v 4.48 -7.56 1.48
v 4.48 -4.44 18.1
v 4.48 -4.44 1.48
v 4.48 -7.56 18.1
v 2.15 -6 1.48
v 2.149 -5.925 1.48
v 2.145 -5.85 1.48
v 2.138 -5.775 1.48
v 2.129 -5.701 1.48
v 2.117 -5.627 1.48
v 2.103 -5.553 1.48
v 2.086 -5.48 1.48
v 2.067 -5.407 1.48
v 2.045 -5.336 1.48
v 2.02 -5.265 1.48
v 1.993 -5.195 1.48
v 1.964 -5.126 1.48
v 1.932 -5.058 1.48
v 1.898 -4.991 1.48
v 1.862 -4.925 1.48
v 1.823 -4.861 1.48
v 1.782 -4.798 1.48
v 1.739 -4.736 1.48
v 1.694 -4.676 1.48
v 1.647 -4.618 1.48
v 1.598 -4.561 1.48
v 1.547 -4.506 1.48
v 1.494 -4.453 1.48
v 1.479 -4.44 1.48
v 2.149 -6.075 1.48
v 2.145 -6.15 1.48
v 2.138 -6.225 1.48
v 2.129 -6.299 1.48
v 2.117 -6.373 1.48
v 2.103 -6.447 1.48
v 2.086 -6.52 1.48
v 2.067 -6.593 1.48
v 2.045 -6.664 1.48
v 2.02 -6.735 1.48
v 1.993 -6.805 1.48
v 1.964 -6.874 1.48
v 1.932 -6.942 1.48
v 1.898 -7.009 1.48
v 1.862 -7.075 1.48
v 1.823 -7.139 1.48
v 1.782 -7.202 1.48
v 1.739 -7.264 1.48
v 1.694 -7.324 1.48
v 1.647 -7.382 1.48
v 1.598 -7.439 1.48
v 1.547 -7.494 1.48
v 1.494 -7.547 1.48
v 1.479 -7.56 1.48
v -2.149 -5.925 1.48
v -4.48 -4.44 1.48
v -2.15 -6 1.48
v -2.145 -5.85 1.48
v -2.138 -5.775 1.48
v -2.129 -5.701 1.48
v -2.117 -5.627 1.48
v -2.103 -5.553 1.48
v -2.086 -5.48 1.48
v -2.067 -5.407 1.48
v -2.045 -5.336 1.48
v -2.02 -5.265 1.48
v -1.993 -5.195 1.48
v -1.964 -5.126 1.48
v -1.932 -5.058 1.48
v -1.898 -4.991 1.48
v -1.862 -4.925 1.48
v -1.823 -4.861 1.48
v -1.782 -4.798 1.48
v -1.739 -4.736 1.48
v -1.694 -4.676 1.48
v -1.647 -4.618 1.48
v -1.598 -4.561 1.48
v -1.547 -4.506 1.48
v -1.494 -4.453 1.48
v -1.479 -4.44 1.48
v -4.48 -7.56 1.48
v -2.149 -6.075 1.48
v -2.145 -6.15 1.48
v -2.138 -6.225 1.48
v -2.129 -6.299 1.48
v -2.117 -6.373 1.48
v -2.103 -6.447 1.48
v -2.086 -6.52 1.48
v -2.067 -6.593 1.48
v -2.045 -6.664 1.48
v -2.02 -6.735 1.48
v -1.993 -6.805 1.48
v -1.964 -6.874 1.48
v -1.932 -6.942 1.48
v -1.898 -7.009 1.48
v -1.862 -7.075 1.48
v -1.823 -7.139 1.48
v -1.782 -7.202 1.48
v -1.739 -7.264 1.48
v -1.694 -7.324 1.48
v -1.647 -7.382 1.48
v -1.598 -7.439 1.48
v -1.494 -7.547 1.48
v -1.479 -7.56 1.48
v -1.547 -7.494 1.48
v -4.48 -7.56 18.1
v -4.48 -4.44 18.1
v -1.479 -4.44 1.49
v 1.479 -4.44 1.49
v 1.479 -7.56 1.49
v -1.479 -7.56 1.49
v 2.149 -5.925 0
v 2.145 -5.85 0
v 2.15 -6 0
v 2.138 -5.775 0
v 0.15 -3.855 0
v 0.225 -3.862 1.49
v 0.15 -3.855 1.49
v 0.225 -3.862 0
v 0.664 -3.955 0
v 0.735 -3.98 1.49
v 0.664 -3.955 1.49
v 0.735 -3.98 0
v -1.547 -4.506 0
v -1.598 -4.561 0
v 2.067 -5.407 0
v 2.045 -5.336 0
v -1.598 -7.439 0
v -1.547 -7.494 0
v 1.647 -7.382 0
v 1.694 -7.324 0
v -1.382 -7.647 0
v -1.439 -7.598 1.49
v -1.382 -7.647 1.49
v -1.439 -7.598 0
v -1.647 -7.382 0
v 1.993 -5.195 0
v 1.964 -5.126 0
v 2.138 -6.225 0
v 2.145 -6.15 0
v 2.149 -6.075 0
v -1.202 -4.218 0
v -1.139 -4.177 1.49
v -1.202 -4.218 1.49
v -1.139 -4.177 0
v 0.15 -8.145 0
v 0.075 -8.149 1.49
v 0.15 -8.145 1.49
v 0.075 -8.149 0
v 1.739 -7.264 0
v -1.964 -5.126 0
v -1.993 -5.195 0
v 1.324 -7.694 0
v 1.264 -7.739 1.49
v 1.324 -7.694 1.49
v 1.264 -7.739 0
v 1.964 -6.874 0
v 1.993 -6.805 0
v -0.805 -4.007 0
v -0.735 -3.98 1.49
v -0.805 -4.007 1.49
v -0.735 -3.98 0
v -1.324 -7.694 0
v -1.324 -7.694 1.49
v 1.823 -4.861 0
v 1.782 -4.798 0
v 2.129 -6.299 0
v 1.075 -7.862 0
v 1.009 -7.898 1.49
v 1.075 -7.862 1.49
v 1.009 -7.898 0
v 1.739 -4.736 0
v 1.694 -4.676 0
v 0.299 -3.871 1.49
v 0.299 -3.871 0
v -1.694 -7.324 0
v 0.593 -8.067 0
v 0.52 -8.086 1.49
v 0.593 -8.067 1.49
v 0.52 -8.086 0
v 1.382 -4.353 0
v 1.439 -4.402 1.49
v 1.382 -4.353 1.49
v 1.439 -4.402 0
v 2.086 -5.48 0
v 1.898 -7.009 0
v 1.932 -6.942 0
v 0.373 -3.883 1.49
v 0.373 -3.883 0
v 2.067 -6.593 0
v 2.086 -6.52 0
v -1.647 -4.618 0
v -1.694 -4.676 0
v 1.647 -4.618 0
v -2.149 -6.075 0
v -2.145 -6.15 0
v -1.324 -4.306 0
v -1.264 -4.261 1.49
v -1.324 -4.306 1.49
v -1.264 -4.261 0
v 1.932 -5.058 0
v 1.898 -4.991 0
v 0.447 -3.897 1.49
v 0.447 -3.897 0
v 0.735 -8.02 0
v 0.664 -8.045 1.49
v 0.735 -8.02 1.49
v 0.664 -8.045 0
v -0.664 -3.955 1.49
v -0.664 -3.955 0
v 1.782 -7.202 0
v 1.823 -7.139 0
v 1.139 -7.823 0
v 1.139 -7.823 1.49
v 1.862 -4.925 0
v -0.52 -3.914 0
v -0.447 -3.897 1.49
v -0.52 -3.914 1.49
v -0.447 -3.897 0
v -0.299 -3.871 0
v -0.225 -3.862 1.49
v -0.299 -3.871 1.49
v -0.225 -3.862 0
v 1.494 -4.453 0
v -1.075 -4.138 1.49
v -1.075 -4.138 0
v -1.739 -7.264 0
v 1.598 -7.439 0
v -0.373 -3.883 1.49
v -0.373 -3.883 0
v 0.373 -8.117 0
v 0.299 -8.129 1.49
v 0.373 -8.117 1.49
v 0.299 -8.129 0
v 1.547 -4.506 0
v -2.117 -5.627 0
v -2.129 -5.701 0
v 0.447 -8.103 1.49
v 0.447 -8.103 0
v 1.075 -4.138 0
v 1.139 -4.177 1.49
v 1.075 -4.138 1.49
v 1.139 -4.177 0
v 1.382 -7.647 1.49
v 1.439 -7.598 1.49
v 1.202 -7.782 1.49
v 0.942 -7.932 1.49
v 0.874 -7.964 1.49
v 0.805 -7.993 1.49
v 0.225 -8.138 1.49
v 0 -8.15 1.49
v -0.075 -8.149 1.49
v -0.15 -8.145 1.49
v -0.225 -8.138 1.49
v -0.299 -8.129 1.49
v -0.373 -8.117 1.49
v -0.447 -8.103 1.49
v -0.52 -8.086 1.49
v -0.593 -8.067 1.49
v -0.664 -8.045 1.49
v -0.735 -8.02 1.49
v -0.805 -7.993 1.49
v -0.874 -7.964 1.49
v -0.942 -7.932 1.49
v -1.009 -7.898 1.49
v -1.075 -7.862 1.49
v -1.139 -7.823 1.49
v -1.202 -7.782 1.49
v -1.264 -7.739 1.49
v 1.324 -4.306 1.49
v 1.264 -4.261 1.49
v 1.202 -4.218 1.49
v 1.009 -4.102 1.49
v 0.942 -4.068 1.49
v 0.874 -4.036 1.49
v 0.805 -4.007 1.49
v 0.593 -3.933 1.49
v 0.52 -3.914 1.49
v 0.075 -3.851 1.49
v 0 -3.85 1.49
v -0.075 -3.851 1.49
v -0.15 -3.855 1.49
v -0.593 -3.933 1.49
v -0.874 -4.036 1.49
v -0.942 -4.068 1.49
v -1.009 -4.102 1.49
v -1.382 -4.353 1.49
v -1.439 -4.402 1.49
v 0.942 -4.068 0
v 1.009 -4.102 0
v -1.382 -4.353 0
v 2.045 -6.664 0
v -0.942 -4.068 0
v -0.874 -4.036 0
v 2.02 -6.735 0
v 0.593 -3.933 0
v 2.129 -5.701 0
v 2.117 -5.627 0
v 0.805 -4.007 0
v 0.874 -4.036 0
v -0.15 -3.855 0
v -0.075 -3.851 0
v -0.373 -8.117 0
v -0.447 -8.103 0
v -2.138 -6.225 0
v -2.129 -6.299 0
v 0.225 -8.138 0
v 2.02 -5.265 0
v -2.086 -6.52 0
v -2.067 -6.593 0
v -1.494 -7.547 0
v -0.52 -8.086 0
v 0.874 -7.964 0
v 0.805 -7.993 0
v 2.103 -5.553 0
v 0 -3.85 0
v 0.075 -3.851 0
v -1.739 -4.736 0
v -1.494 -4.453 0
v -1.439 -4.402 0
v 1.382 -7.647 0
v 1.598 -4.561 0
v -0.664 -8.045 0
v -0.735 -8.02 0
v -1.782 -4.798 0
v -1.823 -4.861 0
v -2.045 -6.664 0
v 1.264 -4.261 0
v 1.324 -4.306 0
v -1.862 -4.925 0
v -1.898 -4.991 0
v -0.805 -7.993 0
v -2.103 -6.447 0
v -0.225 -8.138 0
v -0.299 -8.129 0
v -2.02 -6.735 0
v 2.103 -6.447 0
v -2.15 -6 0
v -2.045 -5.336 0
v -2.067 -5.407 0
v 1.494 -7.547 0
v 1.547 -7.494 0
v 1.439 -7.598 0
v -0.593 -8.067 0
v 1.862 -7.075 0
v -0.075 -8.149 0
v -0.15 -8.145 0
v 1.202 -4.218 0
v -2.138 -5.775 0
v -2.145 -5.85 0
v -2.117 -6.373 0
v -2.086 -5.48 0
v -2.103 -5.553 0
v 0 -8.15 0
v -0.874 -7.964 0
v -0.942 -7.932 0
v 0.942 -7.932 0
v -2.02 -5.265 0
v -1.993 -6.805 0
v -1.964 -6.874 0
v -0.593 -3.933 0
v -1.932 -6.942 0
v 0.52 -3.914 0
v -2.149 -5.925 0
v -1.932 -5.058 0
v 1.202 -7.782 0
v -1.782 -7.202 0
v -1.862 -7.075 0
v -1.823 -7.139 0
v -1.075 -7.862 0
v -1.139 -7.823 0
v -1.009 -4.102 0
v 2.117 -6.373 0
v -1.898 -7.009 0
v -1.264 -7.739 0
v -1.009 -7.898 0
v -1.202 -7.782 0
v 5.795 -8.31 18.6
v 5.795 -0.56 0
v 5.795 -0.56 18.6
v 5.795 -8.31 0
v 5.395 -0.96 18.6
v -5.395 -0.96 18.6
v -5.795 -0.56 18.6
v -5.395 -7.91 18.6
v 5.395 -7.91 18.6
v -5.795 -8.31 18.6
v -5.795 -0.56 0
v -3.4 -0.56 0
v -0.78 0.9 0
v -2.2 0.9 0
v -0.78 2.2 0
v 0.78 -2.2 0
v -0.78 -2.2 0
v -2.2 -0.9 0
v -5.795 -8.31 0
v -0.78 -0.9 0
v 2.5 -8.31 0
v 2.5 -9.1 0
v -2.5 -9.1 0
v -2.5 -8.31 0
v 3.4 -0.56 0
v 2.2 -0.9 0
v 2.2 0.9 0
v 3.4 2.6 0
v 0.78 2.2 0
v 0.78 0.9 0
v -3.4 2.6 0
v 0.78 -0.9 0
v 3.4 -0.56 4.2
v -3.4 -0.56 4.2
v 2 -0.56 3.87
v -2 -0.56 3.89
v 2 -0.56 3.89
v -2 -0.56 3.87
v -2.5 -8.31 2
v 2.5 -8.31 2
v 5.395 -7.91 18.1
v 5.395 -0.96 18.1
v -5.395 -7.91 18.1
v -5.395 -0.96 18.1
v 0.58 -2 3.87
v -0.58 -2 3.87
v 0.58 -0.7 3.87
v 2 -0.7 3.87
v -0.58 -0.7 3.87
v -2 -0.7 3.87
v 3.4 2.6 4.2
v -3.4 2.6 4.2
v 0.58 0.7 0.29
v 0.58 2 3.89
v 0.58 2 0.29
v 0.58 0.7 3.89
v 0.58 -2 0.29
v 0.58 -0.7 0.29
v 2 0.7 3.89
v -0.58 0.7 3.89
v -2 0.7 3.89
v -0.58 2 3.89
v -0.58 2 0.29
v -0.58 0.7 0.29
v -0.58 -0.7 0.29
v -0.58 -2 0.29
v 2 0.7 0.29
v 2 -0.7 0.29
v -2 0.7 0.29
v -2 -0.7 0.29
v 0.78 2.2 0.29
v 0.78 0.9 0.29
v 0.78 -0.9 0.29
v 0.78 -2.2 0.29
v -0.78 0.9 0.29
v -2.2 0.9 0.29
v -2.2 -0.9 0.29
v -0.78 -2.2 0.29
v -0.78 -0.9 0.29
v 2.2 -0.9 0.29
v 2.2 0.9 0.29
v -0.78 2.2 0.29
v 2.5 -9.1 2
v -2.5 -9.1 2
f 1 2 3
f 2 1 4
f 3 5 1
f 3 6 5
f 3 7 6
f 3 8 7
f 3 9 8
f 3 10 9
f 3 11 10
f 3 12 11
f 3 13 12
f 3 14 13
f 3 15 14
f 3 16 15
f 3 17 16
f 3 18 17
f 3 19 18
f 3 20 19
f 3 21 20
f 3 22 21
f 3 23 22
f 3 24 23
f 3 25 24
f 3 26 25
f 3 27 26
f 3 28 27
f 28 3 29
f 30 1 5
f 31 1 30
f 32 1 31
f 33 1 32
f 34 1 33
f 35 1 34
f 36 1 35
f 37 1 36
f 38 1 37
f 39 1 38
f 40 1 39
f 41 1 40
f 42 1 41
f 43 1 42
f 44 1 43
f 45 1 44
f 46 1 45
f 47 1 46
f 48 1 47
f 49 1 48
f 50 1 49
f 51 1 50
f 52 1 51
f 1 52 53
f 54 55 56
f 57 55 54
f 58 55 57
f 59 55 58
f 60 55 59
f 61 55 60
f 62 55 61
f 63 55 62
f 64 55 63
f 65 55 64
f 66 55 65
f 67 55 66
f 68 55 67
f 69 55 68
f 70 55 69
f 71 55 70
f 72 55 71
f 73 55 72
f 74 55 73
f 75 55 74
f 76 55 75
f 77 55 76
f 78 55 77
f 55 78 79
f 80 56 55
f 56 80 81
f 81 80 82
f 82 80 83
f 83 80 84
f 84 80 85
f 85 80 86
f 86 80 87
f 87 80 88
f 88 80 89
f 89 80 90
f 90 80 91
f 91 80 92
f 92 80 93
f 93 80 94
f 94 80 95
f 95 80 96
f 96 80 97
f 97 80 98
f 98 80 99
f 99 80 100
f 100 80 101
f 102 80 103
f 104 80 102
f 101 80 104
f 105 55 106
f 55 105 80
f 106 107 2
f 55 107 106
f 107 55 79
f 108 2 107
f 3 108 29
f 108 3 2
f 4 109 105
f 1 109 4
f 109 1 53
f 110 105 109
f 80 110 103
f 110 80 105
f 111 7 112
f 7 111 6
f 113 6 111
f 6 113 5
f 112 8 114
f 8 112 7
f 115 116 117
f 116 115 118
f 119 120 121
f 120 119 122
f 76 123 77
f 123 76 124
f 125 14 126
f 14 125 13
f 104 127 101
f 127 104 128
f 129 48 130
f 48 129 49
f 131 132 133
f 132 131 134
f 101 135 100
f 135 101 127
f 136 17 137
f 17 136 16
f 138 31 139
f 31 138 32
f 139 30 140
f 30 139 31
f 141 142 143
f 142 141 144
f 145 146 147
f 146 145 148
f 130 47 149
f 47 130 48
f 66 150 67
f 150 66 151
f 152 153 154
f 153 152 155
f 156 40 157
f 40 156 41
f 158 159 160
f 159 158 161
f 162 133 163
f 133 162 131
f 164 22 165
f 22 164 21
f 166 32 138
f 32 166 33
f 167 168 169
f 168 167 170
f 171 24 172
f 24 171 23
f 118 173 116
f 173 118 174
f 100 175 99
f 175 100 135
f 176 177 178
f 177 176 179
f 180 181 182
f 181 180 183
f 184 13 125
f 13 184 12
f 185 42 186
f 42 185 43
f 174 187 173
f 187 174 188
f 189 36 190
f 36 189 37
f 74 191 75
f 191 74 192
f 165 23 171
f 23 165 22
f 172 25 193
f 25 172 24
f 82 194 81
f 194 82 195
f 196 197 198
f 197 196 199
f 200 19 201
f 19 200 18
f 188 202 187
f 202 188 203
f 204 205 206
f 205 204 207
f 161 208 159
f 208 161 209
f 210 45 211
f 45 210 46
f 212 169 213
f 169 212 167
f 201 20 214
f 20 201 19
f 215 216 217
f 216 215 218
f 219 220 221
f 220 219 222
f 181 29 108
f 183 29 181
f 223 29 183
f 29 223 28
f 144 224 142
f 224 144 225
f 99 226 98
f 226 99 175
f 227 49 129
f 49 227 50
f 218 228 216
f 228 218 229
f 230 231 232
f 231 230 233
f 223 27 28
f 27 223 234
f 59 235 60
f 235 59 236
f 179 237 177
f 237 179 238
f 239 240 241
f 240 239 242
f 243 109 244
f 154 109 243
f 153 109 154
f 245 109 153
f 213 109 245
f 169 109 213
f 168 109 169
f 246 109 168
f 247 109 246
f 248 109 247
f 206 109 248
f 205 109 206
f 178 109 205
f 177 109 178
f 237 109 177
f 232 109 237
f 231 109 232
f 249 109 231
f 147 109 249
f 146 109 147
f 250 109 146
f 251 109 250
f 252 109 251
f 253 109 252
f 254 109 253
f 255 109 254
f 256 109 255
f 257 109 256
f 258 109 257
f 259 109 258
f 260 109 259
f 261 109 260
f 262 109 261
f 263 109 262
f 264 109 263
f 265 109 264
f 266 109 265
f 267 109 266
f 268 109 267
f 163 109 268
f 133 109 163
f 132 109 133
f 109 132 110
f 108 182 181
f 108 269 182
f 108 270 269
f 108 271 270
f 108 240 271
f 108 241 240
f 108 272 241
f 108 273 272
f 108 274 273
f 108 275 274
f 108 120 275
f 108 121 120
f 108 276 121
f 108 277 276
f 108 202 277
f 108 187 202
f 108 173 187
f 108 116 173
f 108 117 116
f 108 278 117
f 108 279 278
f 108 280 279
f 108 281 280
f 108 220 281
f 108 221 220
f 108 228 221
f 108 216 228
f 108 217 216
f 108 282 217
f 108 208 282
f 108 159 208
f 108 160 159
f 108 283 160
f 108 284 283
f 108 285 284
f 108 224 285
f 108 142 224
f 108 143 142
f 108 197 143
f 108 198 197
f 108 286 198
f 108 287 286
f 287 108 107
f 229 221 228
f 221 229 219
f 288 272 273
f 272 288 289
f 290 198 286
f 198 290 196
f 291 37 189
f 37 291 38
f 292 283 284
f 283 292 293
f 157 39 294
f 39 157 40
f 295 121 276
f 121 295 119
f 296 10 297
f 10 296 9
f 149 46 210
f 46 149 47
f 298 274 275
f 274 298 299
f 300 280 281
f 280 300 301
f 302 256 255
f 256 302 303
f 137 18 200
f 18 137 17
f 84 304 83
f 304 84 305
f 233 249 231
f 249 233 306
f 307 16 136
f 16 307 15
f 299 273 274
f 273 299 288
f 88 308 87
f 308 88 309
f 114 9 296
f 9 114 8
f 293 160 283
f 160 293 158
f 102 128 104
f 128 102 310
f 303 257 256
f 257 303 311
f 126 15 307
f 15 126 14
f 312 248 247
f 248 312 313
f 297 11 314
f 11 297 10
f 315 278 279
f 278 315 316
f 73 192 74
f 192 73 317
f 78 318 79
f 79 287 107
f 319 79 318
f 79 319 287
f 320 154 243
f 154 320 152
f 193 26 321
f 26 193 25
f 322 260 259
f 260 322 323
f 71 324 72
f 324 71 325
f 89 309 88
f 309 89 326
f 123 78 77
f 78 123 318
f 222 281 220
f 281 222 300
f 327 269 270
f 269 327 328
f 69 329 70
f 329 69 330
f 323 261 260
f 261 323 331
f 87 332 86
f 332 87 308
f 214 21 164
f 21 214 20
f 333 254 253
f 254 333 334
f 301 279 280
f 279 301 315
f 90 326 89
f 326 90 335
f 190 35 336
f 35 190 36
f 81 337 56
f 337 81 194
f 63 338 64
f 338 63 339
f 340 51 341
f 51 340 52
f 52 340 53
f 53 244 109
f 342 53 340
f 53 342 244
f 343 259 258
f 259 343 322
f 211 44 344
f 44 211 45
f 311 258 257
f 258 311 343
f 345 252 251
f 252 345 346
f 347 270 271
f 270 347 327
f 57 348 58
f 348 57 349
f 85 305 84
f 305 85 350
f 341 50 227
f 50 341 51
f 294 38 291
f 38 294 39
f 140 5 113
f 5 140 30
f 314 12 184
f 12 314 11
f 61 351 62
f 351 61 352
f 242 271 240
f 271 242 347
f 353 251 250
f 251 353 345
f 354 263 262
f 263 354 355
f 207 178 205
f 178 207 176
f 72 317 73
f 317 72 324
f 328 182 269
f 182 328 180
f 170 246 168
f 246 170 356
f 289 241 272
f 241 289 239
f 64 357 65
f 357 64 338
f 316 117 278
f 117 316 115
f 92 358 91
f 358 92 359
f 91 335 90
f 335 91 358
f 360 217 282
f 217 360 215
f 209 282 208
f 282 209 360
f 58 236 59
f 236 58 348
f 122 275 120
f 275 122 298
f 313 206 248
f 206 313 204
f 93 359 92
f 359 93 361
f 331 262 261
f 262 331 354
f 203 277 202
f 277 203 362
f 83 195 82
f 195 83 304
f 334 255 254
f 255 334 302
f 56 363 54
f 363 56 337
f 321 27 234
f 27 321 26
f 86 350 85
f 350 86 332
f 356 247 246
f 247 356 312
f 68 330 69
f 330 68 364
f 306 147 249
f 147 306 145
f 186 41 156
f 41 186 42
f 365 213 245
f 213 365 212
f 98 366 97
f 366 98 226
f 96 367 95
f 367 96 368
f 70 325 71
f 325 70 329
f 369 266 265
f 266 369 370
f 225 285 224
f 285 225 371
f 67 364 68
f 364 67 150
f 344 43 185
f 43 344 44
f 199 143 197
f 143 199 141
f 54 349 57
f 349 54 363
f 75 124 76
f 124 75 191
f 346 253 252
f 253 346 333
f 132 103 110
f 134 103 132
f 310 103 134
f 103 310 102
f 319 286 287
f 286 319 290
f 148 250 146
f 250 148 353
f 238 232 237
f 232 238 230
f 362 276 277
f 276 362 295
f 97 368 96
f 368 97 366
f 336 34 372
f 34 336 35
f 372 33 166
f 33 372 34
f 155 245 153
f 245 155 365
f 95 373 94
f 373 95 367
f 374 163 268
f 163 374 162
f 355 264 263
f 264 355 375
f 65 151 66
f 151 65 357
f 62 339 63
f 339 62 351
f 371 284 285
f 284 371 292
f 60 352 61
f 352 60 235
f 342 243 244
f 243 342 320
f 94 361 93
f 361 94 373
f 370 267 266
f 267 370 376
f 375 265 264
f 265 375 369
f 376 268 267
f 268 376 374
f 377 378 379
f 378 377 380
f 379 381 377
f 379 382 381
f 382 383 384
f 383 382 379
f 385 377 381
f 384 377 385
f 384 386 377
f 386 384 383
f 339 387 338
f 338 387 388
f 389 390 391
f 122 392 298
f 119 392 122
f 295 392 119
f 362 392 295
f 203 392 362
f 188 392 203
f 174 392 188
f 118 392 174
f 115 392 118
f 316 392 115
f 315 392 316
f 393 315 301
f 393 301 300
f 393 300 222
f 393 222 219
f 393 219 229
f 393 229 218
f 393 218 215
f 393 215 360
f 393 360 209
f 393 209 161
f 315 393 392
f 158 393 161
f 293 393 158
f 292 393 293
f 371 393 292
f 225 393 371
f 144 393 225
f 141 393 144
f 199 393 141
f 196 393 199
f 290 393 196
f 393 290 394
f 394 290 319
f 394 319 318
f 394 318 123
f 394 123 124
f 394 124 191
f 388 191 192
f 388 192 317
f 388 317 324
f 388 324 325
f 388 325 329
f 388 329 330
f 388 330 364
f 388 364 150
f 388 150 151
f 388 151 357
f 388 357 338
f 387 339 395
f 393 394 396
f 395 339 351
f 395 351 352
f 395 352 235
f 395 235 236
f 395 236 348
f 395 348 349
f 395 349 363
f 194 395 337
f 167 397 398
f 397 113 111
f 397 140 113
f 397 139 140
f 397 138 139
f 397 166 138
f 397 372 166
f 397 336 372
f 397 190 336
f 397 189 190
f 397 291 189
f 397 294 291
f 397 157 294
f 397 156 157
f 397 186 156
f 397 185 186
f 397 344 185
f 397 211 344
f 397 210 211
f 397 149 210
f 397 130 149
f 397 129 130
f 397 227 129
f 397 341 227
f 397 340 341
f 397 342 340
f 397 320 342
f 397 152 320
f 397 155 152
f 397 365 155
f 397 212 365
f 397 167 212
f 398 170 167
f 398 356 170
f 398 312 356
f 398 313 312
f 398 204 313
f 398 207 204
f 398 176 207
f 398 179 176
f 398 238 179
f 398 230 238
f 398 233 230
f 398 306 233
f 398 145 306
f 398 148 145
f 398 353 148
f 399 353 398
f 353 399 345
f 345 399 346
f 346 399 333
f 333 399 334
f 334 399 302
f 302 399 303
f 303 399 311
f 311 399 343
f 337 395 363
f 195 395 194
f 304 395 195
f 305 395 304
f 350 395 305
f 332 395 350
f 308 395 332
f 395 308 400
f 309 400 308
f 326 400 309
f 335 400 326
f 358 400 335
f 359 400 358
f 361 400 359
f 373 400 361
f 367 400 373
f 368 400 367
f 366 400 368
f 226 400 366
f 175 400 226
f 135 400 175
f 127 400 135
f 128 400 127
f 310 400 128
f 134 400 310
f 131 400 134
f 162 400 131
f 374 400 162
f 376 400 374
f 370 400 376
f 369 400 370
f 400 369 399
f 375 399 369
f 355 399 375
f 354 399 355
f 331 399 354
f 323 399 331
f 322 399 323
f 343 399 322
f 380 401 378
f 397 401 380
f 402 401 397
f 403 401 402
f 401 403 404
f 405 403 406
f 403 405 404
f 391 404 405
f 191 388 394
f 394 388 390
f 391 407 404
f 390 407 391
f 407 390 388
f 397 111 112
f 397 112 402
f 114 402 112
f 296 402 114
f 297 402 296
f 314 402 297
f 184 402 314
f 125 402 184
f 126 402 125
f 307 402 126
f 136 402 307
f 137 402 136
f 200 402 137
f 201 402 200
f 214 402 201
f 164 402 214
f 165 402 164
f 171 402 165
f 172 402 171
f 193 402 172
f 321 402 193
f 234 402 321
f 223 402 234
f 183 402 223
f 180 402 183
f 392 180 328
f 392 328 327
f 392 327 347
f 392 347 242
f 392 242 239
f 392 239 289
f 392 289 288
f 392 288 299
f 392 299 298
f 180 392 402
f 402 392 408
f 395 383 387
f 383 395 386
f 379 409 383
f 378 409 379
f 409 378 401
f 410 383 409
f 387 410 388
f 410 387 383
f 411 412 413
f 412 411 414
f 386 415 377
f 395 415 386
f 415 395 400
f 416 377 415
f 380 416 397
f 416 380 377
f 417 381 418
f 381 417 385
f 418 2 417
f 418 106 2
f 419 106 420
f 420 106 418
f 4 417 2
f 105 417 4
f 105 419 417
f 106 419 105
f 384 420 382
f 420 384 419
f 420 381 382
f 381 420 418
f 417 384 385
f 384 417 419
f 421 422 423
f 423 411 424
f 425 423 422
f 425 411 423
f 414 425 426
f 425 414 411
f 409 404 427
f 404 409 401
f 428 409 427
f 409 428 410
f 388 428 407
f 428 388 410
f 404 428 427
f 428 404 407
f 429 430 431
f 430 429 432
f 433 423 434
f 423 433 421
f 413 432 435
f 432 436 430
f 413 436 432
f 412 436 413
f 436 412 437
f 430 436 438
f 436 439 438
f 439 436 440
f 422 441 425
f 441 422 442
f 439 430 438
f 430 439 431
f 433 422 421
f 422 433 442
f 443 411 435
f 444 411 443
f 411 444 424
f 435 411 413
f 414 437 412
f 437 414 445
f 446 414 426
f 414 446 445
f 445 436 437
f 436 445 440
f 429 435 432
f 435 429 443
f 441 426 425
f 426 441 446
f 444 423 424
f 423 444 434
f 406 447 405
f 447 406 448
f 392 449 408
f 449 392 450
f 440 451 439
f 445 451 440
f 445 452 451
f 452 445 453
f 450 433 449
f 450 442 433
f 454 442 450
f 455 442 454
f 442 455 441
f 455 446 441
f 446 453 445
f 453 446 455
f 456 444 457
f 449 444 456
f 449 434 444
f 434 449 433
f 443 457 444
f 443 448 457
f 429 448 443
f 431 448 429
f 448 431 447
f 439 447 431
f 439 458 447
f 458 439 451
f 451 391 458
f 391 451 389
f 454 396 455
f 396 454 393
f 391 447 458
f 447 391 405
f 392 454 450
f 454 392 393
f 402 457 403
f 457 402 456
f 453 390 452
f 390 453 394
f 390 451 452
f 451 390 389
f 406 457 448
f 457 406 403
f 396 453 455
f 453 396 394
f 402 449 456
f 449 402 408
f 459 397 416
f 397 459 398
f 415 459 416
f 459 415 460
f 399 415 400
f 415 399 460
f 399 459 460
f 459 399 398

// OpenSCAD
// file: cherry-female.scad
$fn=180;
eps=0.01;

// Params Cherry mate
cherry_thick1=1.16;
cherry_thick2=1.40;
cherry_wide=4.00;
cherry_high=3.90;
//shaft_high=5.00;
shaft_high=cherry_high+0.3;
shaft_wide=6.80;
shaft_deep=5.20;
fudge_high=0.30;
fudge_plus=0.40;

// Cherry mate
difference() {
    // base body
    translate([0, 0, shaft_high/2]) cube([shaft_wide, shaft_deep, shaft_high], center=true);
    // cherry splines
    translate([0, 0, cherry_high/2-eps]) 
        cube([cherry_thick1, cherry_wide, cherry_high], center=true); 
    translate([0, 0, cherry_high/2-eps]) 
        cube([cherry_wide, cherry_thick2, cherry_high], center=true); 
    // fudge bottom layer
    translate([0, 0, fudge_high/2-eps]) 
        cube([cherry_thick1+fudge_plus, cherry_wide+fudge_plus, fudge_high], center=true); 
    translate([0, 0, fudge_high/2-eps]) 
        cube([cherry_wide+fudge_plus, cherry_thick2+fudge_plus, fudge_high], center=true);
    
    
    // debug
    //translate([0, 0, -0.01]) cube(90);
}
// main file
$fn=180;
eps=0.01;

// keycap model
// 0 is fcu square
// 1 is smaller rect
// 2 is big warn square
// 3 is small TO config
kmod=1;

// Params key cap
kc_tall=18.60; // 17.00 for all except fcu panel is 18.60
kc_high=[11.59, 7.75, 19.00, 7.75];
kc_wide=[11.59, 11.59, 19.00, 11.59];
led_high=[3.12, 3.12, 9.00, 0];
led_wide=[8.96, 8.96, 13.00, 0];
led_x=(kc_wide[kmod]-led_wide[kmod])/2;
//led_y=[1.79, 1.25, 4.50, 0];
led_y=[1.79, 0.75, 5.0, 0];
led_flange_high=1.50;
led_flange_rad=4.30/2;
top_to_sw_center=[8.85, 8.31, 16.40, 8.31];
well_wall_thick=0.40;
well_depth=0.50;

translate([-kc_wide[kmod]/2, -top_to_sw_center[kmod], 0]) {
    // Debug label insert
//    translate([well_wall_thick, well_wall_thick, kc_tall-well_depth]) 
//        color("red", 0.2)
//            cube([kc_wide[kmod]-well_wall_thick*2, kc_high[kmod]-well_wall_thick*2, well_depth]);
//    echo(kc_wide[kmod]-well_wall_thick*2, kc_high[kmod]-well_wall_thick*2);
    
    difference() {
        // keycap body
        union() {
            cube([kc_wide[kmod], kc_high[kmod], kc_tall]);
        }
        // Debug
        //translate([kc_wide[kmod]/2, -eps, -eps]) cube(99);
        // led cavity
        if (led_y[kmod] > 0) {
            translate([led_x, led_y[kmod], led_flange_high-eps*2]) cube([led_wide[kmod], led_high[kmod], 99]);
            translate([kc_wide[kmod]/2, led_y[kmod]+led_high[kmod]/2, -eps]) cylinder(led_flange_high, led_flange_rad, led_flange_rad);
        }
        // top well cavity
        translate([well_wall_thick, well_wall_thick, kc_tall-well_depth])
            cube([kc_wide[kmod]-well_wall_thick*2, kc_high[kmod]-well_wall_thick*2, 99]);
        // key mate cavity
        translate([kc_wide[kmod]/2, top_to_sw_center[kmod], -eps])
            cylinder(3.88, 2.5, 2.5);
    }
}

// fix thin wall near led
if (kmod == 1) {
    translate([-2.5, -top_to_sw_center[kmod]-0.8+eps, 0]) cube([5, 0.8, led_flange_high+0.5]);
}

// key mate
union() {
    include <cherry-female.scad>;
}
